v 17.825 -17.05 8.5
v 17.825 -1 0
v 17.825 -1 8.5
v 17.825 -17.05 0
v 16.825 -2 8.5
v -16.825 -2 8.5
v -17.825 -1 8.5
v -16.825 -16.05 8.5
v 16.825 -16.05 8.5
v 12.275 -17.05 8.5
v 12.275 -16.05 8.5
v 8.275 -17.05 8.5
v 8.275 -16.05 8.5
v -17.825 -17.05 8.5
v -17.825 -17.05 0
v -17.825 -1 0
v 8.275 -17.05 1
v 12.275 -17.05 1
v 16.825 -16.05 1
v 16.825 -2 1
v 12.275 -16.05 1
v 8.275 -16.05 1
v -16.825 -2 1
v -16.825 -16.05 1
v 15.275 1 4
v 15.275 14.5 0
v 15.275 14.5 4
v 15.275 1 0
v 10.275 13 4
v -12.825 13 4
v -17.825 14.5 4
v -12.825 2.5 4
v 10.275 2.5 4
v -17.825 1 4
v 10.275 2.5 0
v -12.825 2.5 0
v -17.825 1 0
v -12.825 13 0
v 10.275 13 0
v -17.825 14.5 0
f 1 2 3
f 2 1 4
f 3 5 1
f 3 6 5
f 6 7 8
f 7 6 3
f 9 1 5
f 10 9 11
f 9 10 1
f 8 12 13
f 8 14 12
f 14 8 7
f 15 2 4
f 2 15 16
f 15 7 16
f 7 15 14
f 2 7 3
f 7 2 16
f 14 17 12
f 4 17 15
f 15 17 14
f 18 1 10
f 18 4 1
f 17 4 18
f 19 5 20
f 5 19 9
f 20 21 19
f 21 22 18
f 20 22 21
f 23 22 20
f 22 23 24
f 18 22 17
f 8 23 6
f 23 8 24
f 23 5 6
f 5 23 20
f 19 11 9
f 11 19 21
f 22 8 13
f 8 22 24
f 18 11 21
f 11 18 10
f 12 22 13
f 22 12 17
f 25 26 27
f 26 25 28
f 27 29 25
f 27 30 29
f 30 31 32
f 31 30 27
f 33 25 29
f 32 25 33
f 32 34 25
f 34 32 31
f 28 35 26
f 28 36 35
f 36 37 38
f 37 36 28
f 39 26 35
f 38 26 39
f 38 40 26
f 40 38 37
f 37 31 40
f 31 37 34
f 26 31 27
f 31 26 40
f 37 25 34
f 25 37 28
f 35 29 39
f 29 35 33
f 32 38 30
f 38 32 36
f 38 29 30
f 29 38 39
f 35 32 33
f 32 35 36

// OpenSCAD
/**
 * Available displays:
 * 
 * Seed Technology:
 * + http://media.digikey.com/pdf/Data%20Sheets/Seeed%20Technology/114990163_Web.pdf
 */

/* [Settings] */

// Height of the border
height = 4;

// Wall thickness border top and bottom.
walls = 1.5;
// Wall thickness border left and right.
wallsSide = 5;
// Wall thickness lid.
wallsLid = 1;

// Tolerance for the display.
spacing = 0.25;
// Tolerance for the lid.
spacingLid = 0.025;

/* [Display measurements] */

// Display length
displayLength = 22.6;
// Display width.
displayWidth = 10;
// Display height without the board.
displayHeight = 6.3;

// Board length.
boardLength = 30;
// Board width.
boardWidth = 11;
// Board height including components on the back.
boardHeight = 2.5;

/* [Hidden] */

$fn = 360;

screwHoleDiameter = 2;

segmentLength = 7;
paddingSegment = 2.2;

//seedVoltMeter(displayColor, "green", holes);
//seedVoltMeter(displayColor, "yellow", holes);
//seedVoltMeter(displayColor, "red", holes);
//seedVoltMeter(displayColor, "blue", holes);
holder(height);

module holder(height) {
  heightLid = wallsLid + height + boardHeight + 1;

  outerLength = displayLength + (wallsSide + spacing ) * 2;
  outerWidth = displayWidth + (walls + spacing ) * 2;
  
  innerLength = displayLength + spacing * 2;
  innerWidth = displayWidth + spacing * 2;

  outerLengthTop = outerLength + (wallsLid + spacing + spacingLid ) * 2;
  outerWidthTop = outerWidth + (wallsLid + spacing + spacingLid) * 2;
  innerLengthTop = outerLengthTop - wallsLid * 2;
  innerWidthTop = outerWidthTop - wallsLid * 2;

  outletWidth = 4;
  xOffsetOutlet = outerLength + spacing + walls - outletWidth - 4.75;

  module bottom() {
    difference() {
      cube([outerLength, outerWidth, height]);

      translate([wallsSide, walls, -1])
        cube([innerLength, innerWidth, height + 2]);
    }
  }

  module top() {
    difference() {
      cube([outerLengthTop, outerWidthTop, heightLid]);

      translate([wallsLid, wallsLid, wallsLid])
        cube([innerLengthTop, innerWidthTop, heightLid  + 1]);

      translate([xOffsetOutlet, -1, wallsLid])
        cube([outletWidth, walls + 2, heightLid + 1]);
    }
  }

  translate([-outerLengthTop / 2, -outerWidthTop - 1, 0])
    top();

  translate([-outerLengthTop / 2, 1, 0])
    bottom();
}

module seedVoltMeter(displayColor="white", ledColor="green", holes=true) {
  screwHoleRadius = screwHoleDiameter /2 ;
  padding = (boardLength - displayLength) / 2;

  segmentWidth = (displayLength - paddingSegment * 4) / 3;

  segments = [
    [padding + 1.5, 1.5, boardHeight],
    [padding + segmentWidth + paddingSegment * 2, 1.5, boardHeight],
    [padding + (segmentWidth + paddingSegment) * 2 + paddingSegment, 1.5, boardHeight]
  ];

  translate([-boardLength / 2, -displayWidth / 2, 0]) {
    color("green") {
      difference() {
        cube([boardLength, boardWidth, boardHeight]);
        
        width = boardWidth / 3 + 1;
        length = (boardLength - displayLength) / 2 + 1;

        translate([-1, -1, -1])
          cube([length, width, boardHeight + 2]);

        translate([boardLength - length + 1, -1, -1])
          cube([length, width, boardHeight + 2]);
        
        translate([boardLength - length + 1, boardWidth -width + 1, -1])
          cube([length, width, boardHeight + 2]);
        
        translate([-1, boardWidth -width + 1, -1])
          cube([length, width, boardHeight + 2]);
        
        translate([length / 2 - 0.5, boardWidth / 2, -1])
          cylinder(r=screwHoleRadius, h = boardHeight + 2);
        translate([boardLength -length / 2 + 0.5, boardWidth / 2, -1])
          cylinder(r=screwHoleRadius, h = boardHeight + 2);
      }
    }
    color(displayColor)
      group() {
        difference() {
          translate([padding, 0, boardHeight])
            cube([displayLength, displayWidth, displayHeight]);

          if(holes)
            for(pos=segments)
              translate(pos)
                segment(displayHeight + 1);
        }
      }

      if(holes)
        for(pos=segments)
          translate(pos)
            color(ledColor)
              segment(displayHeight);
  }

  module segment(height, color="white") {
    length = segmentWidth - 2;
    width = 0.5;
    horizontal = [
      [1, 0, 0],
      [1, (segmentLength - width) / 2, 0],
      [1, segmentLength - width, 0]
    ];

    vertical = [
      [0, width, 0],
      [segmentWidth - width, width, 0],
      [0, width + (segmentLength - width * 3) / 2 +width, 0],
      [segmentWidth - width, width + (segmentLength - width * 3) / 2 +width, 0]
    ];

    group() {
      for(pos=horizontal)
        translate(pos)
          cube([length, width, height]);

      for(pos=vertical)
        translate(pos)
          cube([width, (segmentLength - width * 3) / 2, height]);

      translate([segmentWidth + width * 1.5, 0, 0])
        cube([width, width, height]);
    }
  }
}
